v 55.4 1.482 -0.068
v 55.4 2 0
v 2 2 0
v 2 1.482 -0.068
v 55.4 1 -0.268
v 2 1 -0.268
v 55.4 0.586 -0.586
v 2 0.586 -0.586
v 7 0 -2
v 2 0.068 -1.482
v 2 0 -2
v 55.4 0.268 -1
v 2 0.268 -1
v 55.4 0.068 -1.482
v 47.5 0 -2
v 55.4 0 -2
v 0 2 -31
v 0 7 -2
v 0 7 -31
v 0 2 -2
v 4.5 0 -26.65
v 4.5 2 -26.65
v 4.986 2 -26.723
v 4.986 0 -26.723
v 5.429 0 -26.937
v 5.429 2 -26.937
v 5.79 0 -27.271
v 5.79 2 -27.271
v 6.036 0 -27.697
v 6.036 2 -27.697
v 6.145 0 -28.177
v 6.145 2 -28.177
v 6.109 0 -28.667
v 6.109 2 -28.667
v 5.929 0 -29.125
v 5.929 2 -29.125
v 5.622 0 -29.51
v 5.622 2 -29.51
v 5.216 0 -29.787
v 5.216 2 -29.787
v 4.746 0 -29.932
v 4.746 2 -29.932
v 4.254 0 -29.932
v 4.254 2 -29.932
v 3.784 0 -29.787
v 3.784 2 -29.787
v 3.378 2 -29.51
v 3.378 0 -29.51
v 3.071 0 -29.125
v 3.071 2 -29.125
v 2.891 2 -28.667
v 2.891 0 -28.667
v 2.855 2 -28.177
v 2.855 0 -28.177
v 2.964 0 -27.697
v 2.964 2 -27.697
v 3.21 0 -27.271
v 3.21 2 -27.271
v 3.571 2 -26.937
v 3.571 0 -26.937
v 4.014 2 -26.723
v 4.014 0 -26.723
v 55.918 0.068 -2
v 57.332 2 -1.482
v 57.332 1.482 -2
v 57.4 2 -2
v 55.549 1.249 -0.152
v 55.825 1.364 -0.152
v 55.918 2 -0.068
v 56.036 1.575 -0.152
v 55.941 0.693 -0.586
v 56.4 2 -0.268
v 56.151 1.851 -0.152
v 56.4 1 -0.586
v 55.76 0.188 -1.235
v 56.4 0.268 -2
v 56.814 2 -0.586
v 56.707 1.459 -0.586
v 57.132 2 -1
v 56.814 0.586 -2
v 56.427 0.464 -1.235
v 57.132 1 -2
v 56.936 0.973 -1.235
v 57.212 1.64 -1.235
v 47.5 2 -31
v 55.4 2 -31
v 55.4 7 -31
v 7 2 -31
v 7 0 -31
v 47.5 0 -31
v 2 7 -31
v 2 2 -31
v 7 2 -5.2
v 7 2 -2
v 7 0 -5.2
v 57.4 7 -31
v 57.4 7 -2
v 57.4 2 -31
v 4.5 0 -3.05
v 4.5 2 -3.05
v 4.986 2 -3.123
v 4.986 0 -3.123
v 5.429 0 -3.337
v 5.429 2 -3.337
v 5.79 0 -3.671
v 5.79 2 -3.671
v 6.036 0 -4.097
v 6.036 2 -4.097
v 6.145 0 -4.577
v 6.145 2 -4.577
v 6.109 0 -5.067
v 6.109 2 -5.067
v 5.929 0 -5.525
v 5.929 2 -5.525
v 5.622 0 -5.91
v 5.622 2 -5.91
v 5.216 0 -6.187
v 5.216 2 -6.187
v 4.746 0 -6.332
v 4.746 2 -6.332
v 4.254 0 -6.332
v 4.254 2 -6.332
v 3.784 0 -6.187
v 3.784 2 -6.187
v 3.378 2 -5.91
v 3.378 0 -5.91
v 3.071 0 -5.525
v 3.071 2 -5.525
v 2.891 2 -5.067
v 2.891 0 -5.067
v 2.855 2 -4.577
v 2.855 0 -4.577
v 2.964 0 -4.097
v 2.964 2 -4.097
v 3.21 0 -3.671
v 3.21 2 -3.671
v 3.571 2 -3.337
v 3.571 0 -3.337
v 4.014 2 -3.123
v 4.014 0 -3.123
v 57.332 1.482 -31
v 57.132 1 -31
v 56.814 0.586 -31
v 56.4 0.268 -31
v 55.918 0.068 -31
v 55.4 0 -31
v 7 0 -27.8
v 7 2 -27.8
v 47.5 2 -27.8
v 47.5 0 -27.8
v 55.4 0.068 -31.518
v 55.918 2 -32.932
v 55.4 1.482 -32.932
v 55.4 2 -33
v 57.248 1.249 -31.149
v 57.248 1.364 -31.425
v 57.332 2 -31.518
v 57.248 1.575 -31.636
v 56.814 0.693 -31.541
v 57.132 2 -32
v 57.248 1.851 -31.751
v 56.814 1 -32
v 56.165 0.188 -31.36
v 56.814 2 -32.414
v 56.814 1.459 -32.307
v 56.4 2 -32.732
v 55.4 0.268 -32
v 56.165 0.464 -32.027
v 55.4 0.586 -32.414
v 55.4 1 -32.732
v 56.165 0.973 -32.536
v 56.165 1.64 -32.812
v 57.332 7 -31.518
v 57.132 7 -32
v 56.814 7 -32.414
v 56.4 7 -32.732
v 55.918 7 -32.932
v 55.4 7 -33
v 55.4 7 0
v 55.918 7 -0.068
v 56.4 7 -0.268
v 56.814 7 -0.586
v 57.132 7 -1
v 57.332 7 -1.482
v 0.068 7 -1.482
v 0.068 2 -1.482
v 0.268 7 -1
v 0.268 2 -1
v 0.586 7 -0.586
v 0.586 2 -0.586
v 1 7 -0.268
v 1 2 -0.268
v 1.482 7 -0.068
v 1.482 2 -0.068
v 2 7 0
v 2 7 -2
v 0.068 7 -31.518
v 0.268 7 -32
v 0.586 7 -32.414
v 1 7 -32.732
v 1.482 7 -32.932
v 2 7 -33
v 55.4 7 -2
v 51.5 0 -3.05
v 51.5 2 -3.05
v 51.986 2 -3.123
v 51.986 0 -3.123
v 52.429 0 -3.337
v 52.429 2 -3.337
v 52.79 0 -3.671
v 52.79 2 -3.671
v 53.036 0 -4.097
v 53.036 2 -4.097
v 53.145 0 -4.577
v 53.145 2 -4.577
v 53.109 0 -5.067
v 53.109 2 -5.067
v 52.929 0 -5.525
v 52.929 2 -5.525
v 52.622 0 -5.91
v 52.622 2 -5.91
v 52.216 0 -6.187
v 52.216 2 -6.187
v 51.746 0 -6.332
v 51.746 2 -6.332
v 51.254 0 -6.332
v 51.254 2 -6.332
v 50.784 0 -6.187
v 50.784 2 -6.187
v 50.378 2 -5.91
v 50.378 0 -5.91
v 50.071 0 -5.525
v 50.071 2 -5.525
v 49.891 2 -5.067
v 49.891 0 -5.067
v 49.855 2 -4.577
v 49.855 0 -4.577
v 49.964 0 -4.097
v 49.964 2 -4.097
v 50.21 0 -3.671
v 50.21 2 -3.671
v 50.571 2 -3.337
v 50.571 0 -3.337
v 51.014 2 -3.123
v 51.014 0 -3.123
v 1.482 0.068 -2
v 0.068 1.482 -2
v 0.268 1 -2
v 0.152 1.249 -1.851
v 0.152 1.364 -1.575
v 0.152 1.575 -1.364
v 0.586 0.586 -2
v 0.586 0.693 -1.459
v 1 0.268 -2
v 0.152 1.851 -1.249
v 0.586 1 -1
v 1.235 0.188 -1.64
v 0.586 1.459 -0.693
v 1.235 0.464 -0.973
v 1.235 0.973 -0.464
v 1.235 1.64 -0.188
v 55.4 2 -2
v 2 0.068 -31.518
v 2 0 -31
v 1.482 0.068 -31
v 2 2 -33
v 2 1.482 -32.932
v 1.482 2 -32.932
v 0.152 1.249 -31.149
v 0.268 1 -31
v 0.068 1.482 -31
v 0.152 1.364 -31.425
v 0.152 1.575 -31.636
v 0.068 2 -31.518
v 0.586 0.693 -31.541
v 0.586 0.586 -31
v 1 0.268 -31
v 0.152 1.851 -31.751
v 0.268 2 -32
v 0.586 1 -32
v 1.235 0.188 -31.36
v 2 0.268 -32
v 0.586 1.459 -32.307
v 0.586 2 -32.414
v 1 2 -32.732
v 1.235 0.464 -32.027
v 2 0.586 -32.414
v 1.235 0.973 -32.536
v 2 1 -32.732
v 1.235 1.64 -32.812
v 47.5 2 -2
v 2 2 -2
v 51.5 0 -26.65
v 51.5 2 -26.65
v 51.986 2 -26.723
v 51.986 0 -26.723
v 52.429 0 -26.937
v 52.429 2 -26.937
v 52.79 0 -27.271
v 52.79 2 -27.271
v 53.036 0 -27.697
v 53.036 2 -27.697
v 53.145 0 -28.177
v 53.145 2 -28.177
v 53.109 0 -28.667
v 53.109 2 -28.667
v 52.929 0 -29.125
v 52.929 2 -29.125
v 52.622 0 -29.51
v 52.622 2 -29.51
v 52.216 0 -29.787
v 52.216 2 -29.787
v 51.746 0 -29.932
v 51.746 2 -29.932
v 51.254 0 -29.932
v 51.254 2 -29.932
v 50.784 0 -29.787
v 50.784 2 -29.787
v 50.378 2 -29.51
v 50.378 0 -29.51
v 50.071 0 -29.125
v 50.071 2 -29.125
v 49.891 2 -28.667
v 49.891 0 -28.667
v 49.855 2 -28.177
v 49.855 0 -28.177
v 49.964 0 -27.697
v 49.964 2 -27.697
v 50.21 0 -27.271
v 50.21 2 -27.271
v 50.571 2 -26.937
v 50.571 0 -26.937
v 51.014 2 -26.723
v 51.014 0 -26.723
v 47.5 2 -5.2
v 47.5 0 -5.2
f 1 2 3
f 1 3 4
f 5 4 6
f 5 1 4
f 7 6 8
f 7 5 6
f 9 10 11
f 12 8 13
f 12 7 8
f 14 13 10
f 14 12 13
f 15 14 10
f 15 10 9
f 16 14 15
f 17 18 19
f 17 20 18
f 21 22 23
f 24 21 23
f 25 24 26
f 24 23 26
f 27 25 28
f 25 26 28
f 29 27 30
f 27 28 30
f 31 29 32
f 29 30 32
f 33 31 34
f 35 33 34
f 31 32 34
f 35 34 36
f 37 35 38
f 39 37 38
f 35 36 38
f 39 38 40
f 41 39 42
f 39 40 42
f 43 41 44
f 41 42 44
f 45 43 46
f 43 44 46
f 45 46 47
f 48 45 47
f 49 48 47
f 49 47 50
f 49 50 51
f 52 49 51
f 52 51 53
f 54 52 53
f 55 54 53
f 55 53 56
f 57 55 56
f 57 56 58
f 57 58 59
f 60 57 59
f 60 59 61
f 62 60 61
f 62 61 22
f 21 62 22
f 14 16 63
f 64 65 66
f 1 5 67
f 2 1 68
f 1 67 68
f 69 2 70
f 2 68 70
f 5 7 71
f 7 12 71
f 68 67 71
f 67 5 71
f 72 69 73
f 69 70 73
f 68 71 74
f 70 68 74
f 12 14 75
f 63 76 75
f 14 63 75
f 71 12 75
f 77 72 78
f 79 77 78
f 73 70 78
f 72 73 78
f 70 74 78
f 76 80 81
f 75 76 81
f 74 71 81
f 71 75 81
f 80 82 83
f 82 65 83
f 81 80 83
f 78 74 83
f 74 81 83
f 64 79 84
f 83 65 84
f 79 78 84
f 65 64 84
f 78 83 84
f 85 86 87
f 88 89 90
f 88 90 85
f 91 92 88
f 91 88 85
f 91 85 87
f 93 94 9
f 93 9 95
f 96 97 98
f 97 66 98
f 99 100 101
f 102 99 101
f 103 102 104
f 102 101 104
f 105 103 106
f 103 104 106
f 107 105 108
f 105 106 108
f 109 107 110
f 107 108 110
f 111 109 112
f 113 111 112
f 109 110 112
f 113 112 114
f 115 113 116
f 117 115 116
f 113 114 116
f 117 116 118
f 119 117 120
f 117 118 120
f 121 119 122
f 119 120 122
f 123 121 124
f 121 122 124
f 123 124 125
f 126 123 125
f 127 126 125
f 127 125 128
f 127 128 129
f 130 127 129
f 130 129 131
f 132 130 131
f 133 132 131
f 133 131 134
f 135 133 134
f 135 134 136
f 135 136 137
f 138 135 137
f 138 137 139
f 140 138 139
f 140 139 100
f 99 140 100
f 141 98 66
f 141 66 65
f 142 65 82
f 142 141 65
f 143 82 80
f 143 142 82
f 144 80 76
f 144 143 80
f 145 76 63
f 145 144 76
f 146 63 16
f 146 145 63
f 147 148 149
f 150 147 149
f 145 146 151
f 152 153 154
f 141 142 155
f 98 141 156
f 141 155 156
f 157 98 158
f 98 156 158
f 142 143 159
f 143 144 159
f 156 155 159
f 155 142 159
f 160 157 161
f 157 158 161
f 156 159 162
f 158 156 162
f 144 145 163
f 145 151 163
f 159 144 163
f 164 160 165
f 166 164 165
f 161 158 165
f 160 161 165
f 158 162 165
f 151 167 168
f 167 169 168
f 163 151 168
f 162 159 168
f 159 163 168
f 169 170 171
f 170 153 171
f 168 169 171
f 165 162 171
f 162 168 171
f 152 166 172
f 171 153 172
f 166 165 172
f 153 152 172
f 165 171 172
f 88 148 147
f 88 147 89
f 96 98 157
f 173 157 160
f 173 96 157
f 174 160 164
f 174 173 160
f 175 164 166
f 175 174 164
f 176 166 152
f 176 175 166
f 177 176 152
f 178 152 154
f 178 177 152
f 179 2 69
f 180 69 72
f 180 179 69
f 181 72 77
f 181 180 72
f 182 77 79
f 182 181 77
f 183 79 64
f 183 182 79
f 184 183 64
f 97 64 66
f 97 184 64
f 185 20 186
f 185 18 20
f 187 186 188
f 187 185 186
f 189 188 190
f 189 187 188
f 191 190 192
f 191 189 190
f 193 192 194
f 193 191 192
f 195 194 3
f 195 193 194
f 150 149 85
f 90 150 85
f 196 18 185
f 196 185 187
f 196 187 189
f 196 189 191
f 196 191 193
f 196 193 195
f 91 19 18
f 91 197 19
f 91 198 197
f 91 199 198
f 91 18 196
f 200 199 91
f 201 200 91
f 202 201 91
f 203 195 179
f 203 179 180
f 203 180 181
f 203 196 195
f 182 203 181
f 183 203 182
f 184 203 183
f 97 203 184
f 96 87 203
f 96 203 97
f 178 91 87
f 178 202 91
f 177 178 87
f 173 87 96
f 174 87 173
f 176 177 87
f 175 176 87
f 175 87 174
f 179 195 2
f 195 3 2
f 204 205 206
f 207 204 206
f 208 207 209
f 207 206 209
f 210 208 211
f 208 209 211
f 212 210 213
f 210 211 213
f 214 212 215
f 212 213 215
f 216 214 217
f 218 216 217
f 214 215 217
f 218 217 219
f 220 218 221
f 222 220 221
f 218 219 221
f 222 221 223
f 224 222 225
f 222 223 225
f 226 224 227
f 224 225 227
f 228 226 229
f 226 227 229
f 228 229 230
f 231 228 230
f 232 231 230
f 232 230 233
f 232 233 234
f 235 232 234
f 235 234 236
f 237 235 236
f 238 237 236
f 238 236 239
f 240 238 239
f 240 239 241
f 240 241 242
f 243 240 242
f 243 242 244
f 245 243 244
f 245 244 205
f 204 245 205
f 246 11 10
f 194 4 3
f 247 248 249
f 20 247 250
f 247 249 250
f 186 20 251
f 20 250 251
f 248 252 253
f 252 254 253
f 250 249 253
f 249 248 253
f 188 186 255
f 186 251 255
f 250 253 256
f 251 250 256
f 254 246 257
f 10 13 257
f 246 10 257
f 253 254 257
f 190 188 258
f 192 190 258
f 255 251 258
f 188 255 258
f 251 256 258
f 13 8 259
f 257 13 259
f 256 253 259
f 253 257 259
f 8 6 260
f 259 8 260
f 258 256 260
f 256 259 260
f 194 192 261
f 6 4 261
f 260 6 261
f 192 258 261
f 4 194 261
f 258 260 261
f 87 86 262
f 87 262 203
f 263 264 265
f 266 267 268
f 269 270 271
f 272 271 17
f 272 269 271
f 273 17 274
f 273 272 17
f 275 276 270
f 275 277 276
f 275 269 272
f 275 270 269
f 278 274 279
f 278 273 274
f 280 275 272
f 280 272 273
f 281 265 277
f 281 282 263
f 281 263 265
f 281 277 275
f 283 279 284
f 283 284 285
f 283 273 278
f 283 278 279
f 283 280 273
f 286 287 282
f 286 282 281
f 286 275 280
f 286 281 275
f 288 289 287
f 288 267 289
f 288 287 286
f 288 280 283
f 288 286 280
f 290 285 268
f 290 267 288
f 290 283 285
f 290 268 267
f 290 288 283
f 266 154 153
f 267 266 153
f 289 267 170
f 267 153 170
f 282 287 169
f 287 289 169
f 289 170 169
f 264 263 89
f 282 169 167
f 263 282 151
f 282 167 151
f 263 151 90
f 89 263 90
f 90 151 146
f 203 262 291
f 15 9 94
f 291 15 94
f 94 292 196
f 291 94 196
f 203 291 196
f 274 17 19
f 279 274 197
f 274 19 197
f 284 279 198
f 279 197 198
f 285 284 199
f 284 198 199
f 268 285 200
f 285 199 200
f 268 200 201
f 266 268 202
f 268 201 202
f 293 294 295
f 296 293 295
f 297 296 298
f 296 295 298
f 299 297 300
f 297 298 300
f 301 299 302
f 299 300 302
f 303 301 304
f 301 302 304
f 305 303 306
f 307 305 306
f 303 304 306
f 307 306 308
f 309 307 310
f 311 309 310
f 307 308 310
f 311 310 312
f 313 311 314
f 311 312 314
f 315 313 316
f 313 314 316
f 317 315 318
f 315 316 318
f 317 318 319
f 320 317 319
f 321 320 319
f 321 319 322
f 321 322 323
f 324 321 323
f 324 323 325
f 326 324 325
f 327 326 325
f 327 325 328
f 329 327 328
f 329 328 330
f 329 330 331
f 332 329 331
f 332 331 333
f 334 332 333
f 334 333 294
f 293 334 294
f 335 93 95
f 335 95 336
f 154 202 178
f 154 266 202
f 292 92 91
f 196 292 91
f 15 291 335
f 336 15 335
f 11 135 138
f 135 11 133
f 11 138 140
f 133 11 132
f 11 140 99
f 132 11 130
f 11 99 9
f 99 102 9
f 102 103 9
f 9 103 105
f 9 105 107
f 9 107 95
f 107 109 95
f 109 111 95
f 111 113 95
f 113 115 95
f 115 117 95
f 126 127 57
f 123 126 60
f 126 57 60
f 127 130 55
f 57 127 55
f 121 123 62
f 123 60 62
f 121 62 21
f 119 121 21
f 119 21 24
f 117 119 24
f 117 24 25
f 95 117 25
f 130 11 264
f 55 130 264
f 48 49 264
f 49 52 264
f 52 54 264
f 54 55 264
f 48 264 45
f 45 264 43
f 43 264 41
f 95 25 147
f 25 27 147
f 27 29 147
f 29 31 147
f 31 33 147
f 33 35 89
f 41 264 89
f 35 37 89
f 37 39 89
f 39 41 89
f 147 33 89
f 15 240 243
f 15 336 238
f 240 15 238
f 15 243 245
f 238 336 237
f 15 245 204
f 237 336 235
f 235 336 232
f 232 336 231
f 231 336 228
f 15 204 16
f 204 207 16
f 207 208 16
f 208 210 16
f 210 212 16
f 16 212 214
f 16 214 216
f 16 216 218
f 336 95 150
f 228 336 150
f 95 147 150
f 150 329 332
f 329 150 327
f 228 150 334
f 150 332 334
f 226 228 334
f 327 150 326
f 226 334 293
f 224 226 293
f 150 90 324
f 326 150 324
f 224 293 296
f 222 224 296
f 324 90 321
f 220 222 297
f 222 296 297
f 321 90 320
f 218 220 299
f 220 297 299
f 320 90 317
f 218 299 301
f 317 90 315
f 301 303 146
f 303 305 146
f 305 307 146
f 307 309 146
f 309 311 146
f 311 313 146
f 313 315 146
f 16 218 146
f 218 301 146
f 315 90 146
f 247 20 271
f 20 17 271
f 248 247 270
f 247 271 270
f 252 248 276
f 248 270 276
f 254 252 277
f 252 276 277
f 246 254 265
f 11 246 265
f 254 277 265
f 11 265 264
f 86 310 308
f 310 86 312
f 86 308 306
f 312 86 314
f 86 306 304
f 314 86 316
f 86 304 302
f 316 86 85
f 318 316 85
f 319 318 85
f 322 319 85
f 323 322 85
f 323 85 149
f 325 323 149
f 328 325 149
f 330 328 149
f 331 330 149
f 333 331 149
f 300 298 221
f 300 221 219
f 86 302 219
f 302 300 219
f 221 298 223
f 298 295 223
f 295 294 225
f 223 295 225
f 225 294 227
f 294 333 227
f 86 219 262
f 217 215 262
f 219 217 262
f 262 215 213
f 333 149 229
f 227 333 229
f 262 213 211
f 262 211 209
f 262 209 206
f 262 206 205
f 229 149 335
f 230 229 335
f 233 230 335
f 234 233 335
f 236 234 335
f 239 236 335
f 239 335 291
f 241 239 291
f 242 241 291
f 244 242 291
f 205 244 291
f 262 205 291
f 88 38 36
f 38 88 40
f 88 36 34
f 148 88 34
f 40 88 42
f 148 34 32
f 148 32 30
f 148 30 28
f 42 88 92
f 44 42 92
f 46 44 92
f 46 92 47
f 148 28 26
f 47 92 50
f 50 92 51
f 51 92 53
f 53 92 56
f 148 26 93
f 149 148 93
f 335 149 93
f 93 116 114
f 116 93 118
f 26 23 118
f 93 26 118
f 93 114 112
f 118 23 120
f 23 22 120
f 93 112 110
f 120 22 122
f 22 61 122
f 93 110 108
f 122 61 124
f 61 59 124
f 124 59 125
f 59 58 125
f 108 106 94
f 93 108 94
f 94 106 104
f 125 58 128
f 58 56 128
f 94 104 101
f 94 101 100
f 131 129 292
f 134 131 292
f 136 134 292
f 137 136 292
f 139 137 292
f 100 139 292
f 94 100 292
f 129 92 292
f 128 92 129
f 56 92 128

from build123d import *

# Parameters (mm, degrees)
SKETCH1_W           = 57.4
SKETCH1_H           = 33
BOSS_EXTRUDE1_DEPTH = 7
FILLET1_R           = 2
SHELL3_START        = 2
SHELL3_OUTLINE_W    = 5
SHELL3_OUTLINE_H    = 29
SHELL3_DEPTH        = 53.4
SKETCH2_R           = 1.65
CUT_EXTRUDE1_DEPTH  = 67.398493959
SKETCH3_W           = 40.5
SKETCH3_H           = 3.2
CUT_EXTRUDE2_DEPTH  = 67.398493959


# Read off the part's stored shape, not the designer's step: Shell3
with BuildPart() as part:
    # Sketch1 → Boss-Extrude1 (new body)
    with BuildSketch(Plane(origin=(0, 0, 0), x_dir=(1, 0, 0), z_dir=(0, 1, 0))):
        with Locations((28.7, 16.5)):
            Rectangle(SKETCH1_W, SKETCH1_H)
    extrude(amount=BOSS_EXTRUDE1_DEPTH)

    # Fillet1
    fillet1_edges = [part.edges().sort_by_distance(p)[0] for p in [
        (28.7, 0, -33),
        (57.4, 0, -16.5),
        (28.7, 0, 0),
        (0, 0, -16.5),
        (0, 3.5, -33),
        (57.4, 3.5, -33),
        (57.4, 3.5, 0),
        (0, 3.5, 0),
    ]]
    fillet(fillet1_edges, radius=FILLET1_R)

    # Shell3 outline → Shell3 (cut)
    with BuildSketch(Plane.YZ.offset(SHELL3_START)):
        with Locations((4.5, -16.5)):
            Rectangle(SHELL3_OUTLINE_W, SHELL3_OUTLINE_H)
    extrude(amount=SHELL3_DEPTH, mode=Mode.SUBTRACT)

    # Sketch2 → Cut-Extrude1 (cut, through all)
    with BuildSketch(Plane(origin=(0, 2, 0), x_dir=(1, 0, 0), z_dir=(0, 1, 0))):
        with Locations(Location((4.5, 28.3, 0), (0, 0, 270))):
            Circle(SKETCH2_R)
        with Locations(Location((51.5, 28.3, 0), (0, 0, 270))):
            Circle(SKETCH2_R)
        with Locations(Location((4.5, 4.7, 0), (0, 0, 270))):
            Circle(SKETCH2_R)
        with Locations(Location((51.5, 4.7, 0), (0, 0, 270))):
            Circle(SKETCH2_R)
    extrude(amount=-CUT_EXTRUDE1_DEPTH, mode=Mode.SUBTRACT)

    # Sketch3 → Cut-Extrude2 (cut, through all)
    with BuildSketch(Plane(origin=(0, 2, 0), x_dir=(1, 0, 0), z_dir=(0, 1, 0))):
        with Locations((27.25, 29.4)):
            Rectangle(SKETCH3_W, SKETCH3_H)
        with Locations((27.25, 3.6)):
            Rectangle(SKETCH3_W, SKETCH3_H)
    extrude(amount=-CUT_EXTRUDE2_DEPTH, mode=Mode.SUBTRACT)


solid = part.part
